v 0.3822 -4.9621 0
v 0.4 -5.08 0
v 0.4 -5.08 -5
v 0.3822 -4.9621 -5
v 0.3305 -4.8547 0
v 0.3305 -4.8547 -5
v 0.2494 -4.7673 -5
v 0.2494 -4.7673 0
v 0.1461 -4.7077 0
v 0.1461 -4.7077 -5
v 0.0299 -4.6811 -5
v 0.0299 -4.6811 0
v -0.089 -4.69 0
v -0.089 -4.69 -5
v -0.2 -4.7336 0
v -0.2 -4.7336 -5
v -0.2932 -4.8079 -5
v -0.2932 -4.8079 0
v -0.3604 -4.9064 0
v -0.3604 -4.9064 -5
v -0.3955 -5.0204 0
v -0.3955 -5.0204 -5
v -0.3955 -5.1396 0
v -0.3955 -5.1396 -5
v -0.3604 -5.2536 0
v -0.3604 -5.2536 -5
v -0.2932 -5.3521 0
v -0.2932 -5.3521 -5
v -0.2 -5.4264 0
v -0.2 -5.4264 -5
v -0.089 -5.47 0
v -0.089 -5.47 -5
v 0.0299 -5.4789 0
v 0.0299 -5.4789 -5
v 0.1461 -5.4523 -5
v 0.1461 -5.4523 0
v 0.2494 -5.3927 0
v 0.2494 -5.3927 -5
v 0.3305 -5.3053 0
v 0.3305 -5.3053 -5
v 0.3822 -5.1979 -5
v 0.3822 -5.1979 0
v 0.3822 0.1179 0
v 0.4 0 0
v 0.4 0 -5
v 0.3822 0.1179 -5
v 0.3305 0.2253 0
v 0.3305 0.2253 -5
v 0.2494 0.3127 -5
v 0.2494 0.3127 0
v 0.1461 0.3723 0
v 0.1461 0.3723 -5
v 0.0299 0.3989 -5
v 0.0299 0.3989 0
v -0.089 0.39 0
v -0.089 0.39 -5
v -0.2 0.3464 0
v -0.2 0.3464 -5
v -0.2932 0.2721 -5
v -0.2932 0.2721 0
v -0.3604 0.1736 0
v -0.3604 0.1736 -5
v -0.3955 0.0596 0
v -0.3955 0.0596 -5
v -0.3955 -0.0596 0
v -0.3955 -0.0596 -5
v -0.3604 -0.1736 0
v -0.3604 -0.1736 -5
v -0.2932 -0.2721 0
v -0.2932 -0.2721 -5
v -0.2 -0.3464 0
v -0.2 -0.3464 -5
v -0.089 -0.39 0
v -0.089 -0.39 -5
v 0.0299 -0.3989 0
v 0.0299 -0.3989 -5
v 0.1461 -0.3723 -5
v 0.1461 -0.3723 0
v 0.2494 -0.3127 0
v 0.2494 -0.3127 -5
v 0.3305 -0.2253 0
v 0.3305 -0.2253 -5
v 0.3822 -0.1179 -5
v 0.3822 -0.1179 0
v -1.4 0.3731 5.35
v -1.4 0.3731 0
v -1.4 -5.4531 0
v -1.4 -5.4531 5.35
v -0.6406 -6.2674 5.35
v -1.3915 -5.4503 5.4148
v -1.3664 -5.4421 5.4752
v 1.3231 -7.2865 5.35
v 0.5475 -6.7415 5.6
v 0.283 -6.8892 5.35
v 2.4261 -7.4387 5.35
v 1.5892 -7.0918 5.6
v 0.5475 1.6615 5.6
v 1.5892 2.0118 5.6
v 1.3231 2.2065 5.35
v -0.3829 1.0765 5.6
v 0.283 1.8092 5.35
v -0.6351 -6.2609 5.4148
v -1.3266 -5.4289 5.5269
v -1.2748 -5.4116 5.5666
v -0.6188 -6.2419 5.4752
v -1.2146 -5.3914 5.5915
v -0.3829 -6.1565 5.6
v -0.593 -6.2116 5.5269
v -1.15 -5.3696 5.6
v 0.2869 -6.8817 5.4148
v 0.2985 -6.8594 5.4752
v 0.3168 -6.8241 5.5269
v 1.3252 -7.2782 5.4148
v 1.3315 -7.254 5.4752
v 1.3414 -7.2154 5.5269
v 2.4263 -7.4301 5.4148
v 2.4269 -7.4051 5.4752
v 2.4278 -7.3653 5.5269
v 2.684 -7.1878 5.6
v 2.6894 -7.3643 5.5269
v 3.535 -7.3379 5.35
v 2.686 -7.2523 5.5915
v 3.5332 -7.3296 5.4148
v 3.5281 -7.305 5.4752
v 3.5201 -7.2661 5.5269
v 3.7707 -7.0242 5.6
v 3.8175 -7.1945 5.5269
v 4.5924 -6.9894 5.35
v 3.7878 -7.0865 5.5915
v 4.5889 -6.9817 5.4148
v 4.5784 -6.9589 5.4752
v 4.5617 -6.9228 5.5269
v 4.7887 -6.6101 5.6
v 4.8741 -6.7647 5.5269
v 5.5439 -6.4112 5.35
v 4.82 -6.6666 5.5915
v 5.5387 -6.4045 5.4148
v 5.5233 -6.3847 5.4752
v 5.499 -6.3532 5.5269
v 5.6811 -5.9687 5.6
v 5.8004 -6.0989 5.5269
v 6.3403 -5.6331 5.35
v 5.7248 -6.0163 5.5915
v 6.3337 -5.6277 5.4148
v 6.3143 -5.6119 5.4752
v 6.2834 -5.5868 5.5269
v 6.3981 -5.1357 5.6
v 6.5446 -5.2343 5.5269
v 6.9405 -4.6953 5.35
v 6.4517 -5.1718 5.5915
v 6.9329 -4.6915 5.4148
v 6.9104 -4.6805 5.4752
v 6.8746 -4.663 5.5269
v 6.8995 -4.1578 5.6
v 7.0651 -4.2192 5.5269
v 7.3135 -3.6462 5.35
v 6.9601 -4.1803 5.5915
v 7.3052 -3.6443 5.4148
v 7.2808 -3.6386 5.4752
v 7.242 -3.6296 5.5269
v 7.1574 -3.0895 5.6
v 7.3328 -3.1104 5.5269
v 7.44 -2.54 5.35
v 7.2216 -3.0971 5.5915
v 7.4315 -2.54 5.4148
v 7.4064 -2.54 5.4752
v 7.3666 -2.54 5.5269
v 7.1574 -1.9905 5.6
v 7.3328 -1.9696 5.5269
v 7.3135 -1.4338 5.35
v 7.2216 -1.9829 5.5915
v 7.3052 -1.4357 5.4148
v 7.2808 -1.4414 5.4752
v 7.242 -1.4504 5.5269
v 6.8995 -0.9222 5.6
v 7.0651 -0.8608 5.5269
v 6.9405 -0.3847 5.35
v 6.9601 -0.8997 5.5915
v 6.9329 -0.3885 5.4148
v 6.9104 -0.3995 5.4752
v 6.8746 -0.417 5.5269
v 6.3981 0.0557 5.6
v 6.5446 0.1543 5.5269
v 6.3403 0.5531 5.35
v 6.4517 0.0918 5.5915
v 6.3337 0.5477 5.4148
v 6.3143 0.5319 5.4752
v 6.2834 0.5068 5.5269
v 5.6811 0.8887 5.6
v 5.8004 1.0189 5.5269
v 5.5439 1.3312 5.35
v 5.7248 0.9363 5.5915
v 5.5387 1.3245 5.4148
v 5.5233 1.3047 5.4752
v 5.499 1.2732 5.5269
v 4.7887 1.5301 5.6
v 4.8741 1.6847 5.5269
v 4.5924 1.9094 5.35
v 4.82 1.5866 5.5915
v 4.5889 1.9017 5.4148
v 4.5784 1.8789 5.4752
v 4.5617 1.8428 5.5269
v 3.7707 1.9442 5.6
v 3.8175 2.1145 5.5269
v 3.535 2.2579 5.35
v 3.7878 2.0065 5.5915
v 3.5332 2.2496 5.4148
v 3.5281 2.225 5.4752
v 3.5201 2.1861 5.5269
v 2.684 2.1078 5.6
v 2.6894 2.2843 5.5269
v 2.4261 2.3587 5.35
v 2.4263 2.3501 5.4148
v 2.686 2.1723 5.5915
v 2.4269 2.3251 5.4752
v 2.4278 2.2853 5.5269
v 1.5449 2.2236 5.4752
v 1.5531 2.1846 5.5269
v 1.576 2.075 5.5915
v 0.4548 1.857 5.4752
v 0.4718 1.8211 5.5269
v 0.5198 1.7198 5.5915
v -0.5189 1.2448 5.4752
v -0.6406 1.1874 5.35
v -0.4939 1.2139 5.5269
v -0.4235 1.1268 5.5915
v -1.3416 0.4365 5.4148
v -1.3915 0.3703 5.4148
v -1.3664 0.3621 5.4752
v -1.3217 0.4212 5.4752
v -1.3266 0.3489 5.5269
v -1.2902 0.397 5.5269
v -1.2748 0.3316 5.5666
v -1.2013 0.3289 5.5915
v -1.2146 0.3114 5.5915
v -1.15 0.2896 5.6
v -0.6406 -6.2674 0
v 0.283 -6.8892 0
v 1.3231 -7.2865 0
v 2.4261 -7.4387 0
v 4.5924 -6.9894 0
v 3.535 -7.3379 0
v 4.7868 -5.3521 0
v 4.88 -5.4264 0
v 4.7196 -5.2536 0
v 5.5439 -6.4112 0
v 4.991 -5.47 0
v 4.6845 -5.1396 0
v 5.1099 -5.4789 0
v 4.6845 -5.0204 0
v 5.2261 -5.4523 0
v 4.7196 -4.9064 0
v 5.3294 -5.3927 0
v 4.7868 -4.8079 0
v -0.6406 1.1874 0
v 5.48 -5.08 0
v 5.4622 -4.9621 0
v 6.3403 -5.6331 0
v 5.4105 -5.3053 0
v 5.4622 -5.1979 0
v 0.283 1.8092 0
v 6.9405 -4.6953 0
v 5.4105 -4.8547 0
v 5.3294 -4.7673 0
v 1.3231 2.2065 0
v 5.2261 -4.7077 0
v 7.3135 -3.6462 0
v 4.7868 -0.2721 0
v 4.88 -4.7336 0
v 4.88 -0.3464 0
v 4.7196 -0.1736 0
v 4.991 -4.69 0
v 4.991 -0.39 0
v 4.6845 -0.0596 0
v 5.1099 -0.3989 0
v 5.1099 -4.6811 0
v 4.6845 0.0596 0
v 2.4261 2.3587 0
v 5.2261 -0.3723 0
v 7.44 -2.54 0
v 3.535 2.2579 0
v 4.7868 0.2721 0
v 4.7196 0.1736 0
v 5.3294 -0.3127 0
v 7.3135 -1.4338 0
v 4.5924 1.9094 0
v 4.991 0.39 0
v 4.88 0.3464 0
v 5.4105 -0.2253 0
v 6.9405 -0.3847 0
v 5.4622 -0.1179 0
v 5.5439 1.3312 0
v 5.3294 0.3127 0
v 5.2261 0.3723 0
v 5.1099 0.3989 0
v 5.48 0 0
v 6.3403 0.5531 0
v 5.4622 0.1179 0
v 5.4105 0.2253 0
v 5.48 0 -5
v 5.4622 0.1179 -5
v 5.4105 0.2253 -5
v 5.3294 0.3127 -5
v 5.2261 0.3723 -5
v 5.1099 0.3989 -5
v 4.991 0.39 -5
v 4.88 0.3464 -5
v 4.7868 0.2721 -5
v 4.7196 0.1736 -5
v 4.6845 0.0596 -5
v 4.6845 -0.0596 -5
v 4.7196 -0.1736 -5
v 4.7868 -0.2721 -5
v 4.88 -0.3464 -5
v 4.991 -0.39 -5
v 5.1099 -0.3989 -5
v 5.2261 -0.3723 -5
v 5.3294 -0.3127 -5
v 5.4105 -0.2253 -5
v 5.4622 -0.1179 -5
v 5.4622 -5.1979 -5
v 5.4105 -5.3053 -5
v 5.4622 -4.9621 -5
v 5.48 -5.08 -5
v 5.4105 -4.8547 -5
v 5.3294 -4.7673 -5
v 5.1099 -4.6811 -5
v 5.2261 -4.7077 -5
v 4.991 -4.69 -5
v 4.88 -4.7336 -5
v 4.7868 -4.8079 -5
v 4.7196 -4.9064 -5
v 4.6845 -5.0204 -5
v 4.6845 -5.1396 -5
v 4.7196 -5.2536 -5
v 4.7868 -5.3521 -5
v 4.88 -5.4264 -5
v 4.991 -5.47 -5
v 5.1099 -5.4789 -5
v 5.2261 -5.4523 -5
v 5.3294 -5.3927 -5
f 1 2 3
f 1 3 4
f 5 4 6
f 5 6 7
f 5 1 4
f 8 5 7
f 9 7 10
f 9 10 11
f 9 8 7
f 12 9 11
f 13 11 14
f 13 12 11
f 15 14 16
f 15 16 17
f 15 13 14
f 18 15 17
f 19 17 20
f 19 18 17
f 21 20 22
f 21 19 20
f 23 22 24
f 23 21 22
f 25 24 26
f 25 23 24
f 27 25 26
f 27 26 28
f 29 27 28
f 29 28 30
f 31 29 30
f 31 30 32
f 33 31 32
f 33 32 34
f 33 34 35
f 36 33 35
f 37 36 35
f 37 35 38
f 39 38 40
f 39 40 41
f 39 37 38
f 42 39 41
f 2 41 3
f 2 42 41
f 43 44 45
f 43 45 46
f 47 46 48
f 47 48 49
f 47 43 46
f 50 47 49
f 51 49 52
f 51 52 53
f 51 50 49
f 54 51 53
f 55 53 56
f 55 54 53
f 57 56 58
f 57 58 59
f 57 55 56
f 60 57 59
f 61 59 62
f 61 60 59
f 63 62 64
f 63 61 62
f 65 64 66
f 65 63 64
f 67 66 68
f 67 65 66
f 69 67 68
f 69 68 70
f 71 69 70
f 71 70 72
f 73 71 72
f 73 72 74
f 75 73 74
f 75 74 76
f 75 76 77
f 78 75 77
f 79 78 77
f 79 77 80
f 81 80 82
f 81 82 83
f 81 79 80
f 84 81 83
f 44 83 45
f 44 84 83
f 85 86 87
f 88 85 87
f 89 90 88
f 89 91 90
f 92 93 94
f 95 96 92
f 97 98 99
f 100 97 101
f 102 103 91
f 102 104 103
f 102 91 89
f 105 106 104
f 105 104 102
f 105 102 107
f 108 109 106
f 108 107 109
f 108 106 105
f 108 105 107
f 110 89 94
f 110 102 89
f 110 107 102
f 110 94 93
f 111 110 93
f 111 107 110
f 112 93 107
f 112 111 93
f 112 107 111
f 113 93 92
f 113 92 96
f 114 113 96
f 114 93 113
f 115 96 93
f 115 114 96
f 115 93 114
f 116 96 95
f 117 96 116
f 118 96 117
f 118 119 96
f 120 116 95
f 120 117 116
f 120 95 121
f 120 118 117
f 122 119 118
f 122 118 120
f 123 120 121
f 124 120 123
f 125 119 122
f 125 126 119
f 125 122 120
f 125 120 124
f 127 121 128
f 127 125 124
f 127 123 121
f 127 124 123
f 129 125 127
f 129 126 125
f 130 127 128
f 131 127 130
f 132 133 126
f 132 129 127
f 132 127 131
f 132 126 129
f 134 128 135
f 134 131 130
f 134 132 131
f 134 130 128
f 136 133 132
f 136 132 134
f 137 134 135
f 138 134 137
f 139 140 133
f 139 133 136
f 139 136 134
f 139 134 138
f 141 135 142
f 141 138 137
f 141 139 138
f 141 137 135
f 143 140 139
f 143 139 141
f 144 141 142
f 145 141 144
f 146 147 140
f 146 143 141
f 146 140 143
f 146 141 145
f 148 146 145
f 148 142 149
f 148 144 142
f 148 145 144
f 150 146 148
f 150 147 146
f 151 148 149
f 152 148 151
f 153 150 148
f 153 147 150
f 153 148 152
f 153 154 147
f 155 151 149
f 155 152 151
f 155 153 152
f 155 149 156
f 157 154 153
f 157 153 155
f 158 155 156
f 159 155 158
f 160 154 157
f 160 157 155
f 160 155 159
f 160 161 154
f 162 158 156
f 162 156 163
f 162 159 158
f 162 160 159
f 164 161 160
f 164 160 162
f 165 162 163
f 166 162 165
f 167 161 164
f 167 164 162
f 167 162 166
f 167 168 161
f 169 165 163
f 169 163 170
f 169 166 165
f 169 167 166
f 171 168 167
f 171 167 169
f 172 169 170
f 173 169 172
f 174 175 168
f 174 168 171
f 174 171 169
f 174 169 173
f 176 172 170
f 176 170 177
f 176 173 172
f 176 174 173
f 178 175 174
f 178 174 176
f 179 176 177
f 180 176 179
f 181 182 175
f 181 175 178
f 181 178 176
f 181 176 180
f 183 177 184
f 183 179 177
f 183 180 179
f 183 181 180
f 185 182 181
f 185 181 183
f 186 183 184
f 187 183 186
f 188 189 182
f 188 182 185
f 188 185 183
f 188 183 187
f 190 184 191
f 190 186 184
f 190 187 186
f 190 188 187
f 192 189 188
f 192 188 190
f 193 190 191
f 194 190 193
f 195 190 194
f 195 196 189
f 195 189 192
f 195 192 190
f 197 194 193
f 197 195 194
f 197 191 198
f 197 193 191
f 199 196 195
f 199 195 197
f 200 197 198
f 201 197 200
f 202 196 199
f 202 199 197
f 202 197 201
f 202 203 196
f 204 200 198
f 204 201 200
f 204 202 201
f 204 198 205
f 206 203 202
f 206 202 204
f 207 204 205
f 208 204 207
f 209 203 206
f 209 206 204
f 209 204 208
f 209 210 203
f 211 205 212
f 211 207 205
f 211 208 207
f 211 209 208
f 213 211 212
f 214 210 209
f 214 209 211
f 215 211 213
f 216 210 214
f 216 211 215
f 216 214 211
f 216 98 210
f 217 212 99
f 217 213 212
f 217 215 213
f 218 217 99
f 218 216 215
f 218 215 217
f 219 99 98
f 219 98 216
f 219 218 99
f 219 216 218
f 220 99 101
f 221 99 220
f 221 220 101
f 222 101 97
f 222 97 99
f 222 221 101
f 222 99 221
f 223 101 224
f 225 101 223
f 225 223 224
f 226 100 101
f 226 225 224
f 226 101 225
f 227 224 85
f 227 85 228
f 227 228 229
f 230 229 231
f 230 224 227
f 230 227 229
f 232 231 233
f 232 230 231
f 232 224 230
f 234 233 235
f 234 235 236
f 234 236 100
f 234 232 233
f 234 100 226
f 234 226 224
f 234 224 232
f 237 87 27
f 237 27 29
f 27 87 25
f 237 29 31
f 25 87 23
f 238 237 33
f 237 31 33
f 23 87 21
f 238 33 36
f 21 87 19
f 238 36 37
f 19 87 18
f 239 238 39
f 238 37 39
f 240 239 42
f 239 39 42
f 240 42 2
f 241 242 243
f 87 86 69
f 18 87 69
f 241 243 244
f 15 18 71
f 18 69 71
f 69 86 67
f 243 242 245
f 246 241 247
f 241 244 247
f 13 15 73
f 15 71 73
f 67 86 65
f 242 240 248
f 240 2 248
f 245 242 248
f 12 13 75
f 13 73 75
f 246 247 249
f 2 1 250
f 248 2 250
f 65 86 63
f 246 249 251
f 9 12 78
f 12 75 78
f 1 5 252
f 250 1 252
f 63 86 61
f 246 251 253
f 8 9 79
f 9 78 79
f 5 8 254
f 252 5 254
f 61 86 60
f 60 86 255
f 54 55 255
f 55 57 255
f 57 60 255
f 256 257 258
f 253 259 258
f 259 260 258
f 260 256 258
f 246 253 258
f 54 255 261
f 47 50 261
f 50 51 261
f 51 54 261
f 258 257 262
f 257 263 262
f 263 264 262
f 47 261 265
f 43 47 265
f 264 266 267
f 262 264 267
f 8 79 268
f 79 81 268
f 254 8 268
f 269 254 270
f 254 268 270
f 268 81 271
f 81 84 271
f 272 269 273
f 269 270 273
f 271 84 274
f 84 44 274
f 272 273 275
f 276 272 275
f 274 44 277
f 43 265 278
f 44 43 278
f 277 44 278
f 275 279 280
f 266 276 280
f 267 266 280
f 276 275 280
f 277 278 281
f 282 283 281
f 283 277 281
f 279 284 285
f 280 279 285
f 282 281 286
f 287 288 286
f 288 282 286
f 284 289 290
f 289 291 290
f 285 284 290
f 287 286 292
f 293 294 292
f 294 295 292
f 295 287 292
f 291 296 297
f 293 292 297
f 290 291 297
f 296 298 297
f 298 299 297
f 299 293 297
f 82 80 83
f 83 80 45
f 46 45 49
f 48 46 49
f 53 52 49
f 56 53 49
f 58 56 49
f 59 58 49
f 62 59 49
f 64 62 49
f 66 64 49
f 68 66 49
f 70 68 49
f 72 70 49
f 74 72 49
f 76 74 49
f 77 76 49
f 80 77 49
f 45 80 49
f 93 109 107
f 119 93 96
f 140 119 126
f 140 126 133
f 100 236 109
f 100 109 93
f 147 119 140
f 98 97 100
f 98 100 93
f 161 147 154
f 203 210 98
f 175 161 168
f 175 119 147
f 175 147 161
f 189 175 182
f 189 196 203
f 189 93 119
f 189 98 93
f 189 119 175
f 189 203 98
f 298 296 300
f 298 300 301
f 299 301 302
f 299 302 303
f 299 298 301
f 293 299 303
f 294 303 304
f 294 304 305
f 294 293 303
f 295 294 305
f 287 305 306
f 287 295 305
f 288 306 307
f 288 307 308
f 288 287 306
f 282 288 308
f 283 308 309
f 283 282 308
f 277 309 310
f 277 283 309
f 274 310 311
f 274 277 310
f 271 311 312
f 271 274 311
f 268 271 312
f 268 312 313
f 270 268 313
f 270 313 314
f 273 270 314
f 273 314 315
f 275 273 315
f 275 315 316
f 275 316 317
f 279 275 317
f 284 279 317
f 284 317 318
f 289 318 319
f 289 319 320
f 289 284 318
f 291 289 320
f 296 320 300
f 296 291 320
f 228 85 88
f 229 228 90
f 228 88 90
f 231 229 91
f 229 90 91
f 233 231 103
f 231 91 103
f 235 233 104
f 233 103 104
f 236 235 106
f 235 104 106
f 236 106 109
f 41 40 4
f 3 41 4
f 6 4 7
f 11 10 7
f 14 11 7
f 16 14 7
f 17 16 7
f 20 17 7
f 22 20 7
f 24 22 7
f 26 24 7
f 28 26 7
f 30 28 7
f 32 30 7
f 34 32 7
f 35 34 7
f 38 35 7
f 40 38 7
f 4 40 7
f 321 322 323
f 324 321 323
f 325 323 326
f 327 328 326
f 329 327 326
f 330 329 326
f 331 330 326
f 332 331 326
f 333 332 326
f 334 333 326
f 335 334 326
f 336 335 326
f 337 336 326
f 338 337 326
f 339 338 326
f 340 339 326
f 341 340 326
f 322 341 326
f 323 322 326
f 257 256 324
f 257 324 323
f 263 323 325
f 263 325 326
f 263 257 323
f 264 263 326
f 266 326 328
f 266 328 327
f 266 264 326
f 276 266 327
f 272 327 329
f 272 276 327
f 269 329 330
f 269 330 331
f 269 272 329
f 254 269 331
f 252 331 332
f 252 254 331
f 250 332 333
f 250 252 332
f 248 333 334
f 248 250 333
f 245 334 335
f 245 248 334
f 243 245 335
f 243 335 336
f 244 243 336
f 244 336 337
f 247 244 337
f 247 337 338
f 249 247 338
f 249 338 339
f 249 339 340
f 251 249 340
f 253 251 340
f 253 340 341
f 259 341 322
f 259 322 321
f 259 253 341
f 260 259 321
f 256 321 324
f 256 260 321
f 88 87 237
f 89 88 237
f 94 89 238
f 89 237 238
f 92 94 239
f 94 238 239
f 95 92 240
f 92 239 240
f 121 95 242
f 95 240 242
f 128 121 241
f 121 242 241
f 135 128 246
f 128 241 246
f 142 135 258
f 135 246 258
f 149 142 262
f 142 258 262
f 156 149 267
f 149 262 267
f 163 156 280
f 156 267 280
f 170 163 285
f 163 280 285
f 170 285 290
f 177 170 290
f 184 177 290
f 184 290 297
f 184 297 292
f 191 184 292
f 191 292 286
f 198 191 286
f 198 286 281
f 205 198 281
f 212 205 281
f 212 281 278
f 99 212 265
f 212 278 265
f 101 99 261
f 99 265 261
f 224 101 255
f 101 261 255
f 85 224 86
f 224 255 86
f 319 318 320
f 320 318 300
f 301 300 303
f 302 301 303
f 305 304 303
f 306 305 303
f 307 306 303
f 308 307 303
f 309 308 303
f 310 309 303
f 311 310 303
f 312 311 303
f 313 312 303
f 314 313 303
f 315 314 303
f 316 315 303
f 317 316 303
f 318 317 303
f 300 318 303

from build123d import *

# Parameters (mm, degrees)
PAD001_DEPTH = 5.6
FILLET_R     = 0.25
SKETCH_R     = 0.4
PAD_DEPTH    = 5


with BuildPart() as fillet_body:
    # Sketch001 → Pad001 (new body)
    with BuildSketch(Plane.XY):
        with BuildLine():
            Line((-1.4, 0.373143), (-1.4, -5.453143))
            ThreePointArc((-1.4, -5.453143), (7.44, -2.54), (-1.4, 0.373143))
        make_face()
    extrude(amount=PAD001_DEPTH)

    # Fillet
    fillet_edges = [fillet_body.edges().sort_by_distance(p)[0] for p in [
        (-1.4, -2.54, 5.6),
        (7.44, -2.54, 5.6),
    ]]
    fillet(fillet_edges, radius=FILLET_R)


with BuildPart() as diode_bridge_round_d9_8mm:
    # Sketch → Pad (new body)
    with BuildSketch(Plane.XY):
        Circle(SKETCH_R)
        with Locations((5.08, 0)):
            Circle(SKETCH_R)
        with Locations((5.08, -5.08)):
            Circle(SKETCH_R)
        with Locations((0, -5.08)):
            Circle(SKETCH_R)
    extrude(amount=-PAD_DEPTH)

    # Pad_mp_cp: union Fillet body
    add(fillet_body.part)


solid = diode_bridge_round_d9_8mm.part
